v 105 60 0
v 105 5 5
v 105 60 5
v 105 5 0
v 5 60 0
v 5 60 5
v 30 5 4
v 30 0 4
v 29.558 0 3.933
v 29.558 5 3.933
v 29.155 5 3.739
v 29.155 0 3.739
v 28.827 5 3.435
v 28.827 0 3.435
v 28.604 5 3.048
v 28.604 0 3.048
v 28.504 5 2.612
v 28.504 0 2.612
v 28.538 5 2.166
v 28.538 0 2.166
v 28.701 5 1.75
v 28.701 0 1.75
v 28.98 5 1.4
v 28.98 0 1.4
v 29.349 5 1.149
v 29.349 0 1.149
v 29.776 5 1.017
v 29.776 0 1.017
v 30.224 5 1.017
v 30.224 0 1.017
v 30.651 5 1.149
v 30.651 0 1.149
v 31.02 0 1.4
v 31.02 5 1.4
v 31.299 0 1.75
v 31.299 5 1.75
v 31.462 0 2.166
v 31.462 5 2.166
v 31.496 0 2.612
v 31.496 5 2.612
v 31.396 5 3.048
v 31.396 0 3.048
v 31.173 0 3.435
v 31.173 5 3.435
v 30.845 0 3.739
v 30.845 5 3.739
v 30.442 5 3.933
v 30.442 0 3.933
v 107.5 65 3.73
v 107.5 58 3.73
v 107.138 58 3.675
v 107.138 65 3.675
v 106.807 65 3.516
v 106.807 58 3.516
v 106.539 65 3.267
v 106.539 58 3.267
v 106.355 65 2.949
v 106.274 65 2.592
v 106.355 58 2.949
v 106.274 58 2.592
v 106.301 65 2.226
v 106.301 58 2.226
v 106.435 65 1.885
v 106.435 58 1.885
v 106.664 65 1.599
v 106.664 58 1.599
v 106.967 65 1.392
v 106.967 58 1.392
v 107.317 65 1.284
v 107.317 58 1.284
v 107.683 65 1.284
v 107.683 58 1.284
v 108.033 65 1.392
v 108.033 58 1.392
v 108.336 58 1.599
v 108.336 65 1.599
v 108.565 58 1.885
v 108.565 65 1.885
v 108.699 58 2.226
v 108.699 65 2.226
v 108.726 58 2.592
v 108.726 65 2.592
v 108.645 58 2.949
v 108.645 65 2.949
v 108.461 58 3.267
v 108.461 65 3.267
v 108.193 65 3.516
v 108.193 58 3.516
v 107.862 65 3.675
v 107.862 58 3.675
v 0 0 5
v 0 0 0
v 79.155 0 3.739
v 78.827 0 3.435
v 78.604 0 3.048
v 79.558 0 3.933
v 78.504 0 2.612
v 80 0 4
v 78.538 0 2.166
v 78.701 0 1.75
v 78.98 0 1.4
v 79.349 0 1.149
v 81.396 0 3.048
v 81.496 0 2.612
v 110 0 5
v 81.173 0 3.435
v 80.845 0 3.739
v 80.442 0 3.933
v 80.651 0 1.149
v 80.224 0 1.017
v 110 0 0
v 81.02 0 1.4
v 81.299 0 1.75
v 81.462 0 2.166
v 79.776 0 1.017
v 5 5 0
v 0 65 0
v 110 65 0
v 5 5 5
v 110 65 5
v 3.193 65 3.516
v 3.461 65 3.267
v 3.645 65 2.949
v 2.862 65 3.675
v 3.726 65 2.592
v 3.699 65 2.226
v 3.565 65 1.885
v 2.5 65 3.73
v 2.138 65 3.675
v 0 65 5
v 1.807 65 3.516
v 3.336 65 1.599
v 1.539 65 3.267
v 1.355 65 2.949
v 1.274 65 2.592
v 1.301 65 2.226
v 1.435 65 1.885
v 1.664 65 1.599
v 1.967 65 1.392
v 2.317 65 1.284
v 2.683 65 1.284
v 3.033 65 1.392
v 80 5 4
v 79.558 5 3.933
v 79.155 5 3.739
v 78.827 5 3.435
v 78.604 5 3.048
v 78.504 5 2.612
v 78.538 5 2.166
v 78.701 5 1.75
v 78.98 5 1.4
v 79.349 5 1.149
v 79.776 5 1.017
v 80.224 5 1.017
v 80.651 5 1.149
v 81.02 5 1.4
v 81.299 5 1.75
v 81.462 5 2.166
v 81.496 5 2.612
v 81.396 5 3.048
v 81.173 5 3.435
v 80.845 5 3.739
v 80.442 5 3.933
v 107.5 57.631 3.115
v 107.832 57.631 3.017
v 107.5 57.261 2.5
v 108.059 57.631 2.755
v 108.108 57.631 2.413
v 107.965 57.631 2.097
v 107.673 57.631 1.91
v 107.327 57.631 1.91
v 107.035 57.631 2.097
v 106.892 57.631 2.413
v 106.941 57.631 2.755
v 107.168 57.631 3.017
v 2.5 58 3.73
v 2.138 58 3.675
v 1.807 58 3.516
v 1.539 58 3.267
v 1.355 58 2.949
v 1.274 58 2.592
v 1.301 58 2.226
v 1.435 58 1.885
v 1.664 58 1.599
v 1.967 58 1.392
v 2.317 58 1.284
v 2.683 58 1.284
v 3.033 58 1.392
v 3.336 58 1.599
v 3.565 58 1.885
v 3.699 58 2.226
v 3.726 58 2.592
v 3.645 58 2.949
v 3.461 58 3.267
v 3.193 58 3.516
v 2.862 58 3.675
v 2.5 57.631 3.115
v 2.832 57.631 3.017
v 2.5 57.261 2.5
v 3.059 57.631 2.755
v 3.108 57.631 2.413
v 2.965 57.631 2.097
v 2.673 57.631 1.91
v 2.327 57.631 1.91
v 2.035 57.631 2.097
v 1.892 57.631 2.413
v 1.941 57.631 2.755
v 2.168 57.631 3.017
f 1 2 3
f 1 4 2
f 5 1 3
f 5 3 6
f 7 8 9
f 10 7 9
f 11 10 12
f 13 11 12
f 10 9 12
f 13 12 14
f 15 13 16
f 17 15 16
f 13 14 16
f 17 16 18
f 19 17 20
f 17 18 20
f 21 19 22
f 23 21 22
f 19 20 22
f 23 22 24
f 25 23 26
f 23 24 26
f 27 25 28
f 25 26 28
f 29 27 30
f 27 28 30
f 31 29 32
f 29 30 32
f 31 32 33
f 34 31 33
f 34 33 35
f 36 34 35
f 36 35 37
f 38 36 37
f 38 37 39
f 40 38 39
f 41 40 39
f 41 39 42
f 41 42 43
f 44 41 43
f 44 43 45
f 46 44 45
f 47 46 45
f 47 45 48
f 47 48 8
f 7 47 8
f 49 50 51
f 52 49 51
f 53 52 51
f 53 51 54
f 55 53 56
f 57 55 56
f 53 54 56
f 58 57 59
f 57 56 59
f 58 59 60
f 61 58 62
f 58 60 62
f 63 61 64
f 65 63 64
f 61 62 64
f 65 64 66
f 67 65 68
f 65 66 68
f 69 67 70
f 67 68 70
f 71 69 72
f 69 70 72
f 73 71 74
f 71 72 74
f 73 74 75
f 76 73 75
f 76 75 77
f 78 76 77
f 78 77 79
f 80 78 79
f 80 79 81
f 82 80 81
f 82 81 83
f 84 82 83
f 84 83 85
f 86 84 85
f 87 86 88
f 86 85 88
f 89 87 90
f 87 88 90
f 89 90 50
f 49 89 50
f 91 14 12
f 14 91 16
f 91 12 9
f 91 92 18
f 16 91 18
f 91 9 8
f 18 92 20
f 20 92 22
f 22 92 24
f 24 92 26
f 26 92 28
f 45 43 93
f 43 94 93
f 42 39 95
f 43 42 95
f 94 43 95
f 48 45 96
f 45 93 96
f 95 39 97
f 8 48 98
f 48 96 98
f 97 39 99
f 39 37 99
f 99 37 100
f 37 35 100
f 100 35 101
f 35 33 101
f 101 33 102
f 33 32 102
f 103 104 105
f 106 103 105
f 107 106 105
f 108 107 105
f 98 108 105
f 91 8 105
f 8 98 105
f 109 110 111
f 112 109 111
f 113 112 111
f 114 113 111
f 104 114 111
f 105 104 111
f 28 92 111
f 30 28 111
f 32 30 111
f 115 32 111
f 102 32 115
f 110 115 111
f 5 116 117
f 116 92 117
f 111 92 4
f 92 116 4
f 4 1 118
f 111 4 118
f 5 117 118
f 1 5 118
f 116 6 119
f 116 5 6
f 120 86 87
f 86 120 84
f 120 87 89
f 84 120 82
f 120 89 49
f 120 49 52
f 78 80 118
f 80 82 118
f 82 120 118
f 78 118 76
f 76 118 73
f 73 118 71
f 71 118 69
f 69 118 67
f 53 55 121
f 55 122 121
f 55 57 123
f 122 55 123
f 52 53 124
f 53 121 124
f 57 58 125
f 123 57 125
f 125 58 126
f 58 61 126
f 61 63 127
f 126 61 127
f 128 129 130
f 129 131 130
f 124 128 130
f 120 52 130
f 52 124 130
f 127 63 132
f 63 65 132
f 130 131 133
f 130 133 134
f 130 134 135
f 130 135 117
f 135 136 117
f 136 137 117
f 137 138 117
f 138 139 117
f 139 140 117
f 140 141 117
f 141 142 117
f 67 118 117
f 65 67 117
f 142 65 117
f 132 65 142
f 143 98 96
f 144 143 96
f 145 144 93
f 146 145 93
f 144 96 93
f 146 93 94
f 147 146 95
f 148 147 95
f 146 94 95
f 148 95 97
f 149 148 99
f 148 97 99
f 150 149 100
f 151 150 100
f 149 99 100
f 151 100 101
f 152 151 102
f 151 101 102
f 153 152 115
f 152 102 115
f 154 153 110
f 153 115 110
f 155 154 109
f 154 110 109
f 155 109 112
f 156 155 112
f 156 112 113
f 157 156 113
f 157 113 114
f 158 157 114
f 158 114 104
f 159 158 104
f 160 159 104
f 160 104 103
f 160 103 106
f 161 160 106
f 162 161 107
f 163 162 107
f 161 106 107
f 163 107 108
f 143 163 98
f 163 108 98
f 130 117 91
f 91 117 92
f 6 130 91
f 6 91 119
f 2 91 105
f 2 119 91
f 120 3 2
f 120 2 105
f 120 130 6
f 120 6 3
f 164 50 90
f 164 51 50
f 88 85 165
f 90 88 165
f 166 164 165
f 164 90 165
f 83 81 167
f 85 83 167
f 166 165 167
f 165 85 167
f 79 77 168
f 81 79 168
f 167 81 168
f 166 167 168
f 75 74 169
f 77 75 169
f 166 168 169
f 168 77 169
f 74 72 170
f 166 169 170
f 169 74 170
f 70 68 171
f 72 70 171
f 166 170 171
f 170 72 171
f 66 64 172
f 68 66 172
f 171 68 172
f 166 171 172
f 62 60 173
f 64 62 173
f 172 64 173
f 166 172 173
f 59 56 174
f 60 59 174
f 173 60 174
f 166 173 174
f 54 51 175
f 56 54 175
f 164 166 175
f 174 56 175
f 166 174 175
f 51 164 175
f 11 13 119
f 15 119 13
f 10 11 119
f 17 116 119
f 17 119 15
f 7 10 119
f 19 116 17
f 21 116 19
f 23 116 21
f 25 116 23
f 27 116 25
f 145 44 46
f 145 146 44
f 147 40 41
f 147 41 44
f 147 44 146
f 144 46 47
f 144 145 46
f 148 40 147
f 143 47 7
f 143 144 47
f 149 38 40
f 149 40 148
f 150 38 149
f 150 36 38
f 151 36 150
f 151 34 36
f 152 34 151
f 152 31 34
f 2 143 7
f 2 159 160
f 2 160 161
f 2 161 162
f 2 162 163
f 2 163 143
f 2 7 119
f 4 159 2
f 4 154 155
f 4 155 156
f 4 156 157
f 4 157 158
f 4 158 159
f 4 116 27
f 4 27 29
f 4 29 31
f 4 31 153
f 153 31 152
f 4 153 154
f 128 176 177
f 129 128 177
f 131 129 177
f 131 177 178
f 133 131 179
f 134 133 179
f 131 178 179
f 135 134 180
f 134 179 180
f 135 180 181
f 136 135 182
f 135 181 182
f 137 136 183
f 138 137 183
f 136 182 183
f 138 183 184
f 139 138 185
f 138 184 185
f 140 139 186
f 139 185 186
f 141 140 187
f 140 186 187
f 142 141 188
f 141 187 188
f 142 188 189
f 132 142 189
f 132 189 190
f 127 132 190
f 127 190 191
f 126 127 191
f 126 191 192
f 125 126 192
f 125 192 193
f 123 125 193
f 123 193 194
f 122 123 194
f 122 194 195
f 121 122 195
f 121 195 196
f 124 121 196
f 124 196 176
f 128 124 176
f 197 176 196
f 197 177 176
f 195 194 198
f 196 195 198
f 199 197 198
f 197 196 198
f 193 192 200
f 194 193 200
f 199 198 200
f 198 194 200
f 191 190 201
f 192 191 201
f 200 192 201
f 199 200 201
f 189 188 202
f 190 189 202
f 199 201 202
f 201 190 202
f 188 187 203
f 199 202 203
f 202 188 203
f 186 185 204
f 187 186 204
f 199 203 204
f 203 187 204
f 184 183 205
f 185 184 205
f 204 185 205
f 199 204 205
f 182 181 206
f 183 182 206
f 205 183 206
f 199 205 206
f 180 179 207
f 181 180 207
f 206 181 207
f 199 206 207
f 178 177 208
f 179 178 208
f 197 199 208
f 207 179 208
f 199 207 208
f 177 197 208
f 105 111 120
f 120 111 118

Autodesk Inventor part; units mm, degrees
ref_plane "YZ Plane" through (0, 0, 0) normal (1, 0, 0) x (0, 1, 0)
ref_plane "XZ Plane" through (0, 0, 0) normal (0, 1, 0) x (-1, 0, 0)
ref_plane "XY Plane" through (0, 0, 0) normal (0, 0, 1) x (1, 0, 0)
sketch "Sketch1" plane through (0, 0, 0) normal (0, 0, 1) x (1, 0, 0)
  line L0 (0, 0) -> (110, 0)
  line L1 (110, 0) -> (110, 65)
  line L2 (110, 65) -> (0, 65)
  line L3 (0, 65) -> (0, 0)
  line L4 (5, 5) -> (105, 5)
  line L5 (105, 5) -> (105, 60)
  line L6 (105, 60) -> (5, 60)
  line L7 (5, 60) -> (5, 5)
  dimension "d0" = 65
  dimension "d1" = 110
  dimension "d4" = 5
extrude "Extrusion1" add sketch "Sketch1" along normal blind 5 contours L3 L2 L1 L0 | L7 L6 L5 L4
extrude "Extrusion2" cut sketch "Sketch1" along normal blind 5 contours L7 L6 L5 L4
sketch "Sketch2" plane through (0, 65, 0) normal (0, 1, 0) x (1, 0, 0)
  line L0 (110, 0) -> (110, -5) projected
  line L1 (110, 0) -> (0, 0) projected
  line L2 (0, 0) -> (0, -5) projected
  point P0 (2.5, -2.5)
  point P1 (107.5, -2.5)
  dimension "d14" = 2.5
  dimension "d15" = 2.5
  dimension "d16" = 2.5
  dimension "d17" = 2.5
hole "Hole1" at (2.5, 65, 2.5) at (107.5, 65, 2.5) direction (0, -1, 0) diameter 2.459 depth 7 tip angle 118 thread size "M3x0.5" class "6H" standard "ISO Metric profile"
sketch "Sketch4" plane through (5, 5, 0) normal (0, 1, 0) x (1, 0, 0)
  line L0 (0, 0) -> (0, -5) construction
  line L1 (0, -2.5) -> (100, -2.5) construction
  line L2 (100, 0) -> (100, -5) construction
  point P0 (-5, 0)
  point P1 (75, -2.5)
  point P2 (25, -2.5)
  dimension "d36" = 25
  dimension "d37" = 25
hole "Hole3" at (80, 5, 2.5) at (30, 5, 2.5) direction (0, -1, 0) diameter 3 depth 8.8 tip angle 118
properties part number "Camera plate shell" material "Aluminum 6061"
